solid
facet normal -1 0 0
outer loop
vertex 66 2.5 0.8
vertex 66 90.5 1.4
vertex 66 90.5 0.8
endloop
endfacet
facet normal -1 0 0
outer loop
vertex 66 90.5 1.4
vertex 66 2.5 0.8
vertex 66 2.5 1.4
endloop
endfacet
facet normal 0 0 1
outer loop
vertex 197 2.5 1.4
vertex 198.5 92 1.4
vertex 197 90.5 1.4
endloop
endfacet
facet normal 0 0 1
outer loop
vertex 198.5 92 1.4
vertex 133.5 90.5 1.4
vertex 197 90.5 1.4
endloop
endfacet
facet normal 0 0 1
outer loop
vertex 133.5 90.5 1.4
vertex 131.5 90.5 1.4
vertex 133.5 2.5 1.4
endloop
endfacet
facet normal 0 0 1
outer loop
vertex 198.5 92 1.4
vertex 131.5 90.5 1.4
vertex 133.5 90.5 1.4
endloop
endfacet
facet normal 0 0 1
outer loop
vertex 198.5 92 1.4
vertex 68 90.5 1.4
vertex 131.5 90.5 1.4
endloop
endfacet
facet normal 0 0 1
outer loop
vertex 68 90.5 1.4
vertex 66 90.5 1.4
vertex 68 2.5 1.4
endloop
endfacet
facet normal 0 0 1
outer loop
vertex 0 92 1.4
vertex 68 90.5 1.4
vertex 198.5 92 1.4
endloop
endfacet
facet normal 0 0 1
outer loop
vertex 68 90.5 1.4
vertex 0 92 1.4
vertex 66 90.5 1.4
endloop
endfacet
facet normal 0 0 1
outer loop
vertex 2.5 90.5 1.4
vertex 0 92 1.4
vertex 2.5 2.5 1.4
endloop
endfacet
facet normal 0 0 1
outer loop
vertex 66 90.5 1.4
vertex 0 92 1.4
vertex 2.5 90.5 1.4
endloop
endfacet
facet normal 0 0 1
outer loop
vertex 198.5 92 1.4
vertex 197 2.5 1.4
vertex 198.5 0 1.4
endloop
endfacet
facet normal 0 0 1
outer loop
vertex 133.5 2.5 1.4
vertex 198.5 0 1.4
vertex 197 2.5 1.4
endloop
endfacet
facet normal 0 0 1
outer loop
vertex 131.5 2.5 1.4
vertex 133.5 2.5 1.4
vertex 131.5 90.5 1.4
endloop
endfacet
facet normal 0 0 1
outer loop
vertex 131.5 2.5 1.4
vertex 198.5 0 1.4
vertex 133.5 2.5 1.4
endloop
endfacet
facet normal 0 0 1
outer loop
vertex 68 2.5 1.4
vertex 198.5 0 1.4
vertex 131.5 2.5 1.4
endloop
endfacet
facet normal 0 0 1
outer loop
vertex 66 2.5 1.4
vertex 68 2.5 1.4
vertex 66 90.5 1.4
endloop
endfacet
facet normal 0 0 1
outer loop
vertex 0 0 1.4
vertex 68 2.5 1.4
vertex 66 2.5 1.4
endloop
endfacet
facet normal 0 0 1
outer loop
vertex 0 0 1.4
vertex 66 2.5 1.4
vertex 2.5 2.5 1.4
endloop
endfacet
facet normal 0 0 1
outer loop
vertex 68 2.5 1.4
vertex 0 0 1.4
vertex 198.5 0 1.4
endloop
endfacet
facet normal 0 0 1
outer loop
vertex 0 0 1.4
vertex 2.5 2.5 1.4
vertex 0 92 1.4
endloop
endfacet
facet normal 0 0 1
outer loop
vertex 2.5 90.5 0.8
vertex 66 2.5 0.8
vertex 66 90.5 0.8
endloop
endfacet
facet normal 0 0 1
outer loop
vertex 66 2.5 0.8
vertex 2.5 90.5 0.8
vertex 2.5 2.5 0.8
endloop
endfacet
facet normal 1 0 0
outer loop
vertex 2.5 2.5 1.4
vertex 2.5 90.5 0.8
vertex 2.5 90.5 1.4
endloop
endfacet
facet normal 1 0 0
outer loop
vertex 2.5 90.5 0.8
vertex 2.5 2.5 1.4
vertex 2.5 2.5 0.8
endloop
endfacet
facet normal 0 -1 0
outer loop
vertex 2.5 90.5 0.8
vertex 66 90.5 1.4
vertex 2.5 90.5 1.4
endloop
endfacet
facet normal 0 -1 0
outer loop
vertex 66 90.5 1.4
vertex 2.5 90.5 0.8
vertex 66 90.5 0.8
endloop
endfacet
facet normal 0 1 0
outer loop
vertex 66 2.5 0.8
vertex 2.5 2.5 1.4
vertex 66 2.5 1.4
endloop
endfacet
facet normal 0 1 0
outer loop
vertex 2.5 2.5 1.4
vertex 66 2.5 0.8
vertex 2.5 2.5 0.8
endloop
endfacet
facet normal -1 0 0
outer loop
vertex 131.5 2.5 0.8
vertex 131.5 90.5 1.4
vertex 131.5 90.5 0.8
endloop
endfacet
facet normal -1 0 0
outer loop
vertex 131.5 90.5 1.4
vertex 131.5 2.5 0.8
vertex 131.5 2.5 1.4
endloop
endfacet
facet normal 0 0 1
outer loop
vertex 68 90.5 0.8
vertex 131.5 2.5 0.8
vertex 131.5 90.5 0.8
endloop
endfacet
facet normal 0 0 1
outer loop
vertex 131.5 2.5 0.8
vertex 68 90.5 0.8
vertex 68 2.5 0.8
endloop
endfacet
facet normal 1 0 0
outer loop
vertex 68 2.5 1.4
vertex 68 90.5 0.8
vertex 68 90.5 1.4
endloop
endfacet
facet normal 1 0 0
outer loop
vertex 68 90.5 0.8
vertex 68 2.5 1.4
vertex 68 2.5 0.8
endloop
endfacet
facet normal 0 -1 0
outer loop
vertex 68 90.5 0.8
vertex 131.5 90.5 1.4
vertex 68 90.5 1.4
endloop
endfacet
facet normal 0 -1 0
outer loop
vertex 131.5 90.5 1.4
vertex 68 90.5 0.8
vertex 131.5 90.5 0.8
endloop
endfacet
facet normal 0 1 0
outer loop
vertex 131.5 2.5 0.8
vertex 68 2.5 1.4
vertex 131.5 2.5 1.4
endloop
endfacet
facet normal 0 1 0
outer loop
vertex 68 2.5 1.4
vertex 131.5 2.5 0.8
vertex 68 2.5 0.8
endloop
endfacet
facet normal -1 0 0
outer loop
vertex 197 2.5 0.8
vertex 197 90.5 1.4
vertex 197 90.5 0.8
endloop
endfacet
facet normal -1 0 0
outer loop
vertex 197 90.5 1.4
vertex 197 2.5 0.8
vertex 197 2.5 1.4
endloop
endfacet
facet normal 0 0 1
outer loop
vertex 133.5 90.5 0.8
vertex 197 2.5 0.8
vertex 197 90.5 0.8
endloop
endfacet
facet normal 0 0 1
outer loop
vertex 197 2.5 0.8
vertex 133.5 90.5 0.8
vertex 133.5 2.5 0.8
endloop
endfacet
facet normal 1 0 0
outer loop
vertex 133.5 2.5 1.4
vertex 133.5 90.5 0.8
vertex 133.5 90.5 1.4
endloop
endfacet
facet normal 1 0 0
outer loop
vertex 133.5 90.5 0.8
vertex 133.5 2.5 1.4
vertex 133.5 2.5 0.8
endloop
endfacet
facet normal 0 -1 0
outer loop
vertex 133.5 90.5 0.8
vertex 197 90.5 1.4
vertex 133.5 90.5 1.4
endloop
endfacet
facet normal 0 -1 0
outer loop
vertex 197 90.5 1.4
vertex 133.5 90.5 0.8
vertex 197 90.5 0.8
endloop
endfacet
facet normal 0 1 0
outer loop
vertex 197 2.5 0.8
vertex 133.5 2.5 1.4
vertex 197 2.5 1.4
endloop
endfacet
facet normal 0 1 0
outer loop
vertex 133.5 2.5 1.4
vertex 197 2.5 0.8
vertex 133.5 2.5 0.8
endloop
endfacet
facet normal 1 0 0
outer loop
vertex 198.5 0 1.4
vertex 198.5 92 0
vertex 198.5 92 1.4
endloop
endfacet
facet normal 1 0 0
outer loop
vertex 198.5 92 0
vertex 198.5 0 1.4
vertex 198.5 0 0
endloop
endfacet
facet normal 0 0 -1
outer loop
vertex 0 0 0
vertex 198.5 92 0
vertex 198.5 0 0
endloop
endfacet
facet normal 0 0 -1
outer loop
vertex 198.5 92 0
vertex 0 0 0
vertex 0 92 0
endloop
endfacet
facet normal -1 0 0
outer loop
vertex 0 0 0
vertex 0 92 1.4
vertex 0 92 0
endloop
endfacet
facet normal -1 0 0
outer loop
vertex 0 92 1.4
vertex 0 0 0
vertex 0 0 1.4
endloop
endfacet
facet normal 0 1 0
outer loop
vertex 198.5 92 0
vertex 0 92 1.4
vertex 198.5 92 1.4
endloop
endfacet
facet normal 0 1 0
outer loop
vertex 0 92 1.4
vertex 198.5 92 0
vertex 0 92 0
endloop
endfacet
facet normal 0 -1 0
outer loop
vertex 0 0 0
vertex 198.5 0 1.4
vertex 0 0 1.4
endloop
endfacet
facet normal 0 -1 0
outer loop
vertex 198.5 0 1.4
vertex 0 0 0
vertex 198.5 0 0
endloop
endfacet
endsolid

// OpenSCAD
sheet_thickness = 2.05;

card_x = 63.5;
card_y = 88.0;
card_z = .6;

inner_border = 2;
outer_border = 1;
number_of_cards = 3;

outer_x = (card_x * number_of_cards) + (inner_border * (number_of_cards + 1)) + outer_border;
outer_y = card_y + (inner_border * 2) + outer_border;
outer_z = inner_border;

inner_x = outer_x - outer_border;
inner_y = outer_y - outer_border;
inner_z = inner_border - card_z;

difference() {
    cube([inner_x, inner_y, inner_z]);
    
    for (i = [1 : number_of_cards]) {
        x_inset = (outer_border / 2) + (inner_border * i) +  (card_x * (i - 1));
        y_inset = (outer_border / 2) + inner_border;
        z_inset = outer_z - (card_z * 2);

        translate([x_inset, y_inset, (inner_z - card_z)]) {
            cube([card_x, card_y, card_z]);
        }
    }
}
